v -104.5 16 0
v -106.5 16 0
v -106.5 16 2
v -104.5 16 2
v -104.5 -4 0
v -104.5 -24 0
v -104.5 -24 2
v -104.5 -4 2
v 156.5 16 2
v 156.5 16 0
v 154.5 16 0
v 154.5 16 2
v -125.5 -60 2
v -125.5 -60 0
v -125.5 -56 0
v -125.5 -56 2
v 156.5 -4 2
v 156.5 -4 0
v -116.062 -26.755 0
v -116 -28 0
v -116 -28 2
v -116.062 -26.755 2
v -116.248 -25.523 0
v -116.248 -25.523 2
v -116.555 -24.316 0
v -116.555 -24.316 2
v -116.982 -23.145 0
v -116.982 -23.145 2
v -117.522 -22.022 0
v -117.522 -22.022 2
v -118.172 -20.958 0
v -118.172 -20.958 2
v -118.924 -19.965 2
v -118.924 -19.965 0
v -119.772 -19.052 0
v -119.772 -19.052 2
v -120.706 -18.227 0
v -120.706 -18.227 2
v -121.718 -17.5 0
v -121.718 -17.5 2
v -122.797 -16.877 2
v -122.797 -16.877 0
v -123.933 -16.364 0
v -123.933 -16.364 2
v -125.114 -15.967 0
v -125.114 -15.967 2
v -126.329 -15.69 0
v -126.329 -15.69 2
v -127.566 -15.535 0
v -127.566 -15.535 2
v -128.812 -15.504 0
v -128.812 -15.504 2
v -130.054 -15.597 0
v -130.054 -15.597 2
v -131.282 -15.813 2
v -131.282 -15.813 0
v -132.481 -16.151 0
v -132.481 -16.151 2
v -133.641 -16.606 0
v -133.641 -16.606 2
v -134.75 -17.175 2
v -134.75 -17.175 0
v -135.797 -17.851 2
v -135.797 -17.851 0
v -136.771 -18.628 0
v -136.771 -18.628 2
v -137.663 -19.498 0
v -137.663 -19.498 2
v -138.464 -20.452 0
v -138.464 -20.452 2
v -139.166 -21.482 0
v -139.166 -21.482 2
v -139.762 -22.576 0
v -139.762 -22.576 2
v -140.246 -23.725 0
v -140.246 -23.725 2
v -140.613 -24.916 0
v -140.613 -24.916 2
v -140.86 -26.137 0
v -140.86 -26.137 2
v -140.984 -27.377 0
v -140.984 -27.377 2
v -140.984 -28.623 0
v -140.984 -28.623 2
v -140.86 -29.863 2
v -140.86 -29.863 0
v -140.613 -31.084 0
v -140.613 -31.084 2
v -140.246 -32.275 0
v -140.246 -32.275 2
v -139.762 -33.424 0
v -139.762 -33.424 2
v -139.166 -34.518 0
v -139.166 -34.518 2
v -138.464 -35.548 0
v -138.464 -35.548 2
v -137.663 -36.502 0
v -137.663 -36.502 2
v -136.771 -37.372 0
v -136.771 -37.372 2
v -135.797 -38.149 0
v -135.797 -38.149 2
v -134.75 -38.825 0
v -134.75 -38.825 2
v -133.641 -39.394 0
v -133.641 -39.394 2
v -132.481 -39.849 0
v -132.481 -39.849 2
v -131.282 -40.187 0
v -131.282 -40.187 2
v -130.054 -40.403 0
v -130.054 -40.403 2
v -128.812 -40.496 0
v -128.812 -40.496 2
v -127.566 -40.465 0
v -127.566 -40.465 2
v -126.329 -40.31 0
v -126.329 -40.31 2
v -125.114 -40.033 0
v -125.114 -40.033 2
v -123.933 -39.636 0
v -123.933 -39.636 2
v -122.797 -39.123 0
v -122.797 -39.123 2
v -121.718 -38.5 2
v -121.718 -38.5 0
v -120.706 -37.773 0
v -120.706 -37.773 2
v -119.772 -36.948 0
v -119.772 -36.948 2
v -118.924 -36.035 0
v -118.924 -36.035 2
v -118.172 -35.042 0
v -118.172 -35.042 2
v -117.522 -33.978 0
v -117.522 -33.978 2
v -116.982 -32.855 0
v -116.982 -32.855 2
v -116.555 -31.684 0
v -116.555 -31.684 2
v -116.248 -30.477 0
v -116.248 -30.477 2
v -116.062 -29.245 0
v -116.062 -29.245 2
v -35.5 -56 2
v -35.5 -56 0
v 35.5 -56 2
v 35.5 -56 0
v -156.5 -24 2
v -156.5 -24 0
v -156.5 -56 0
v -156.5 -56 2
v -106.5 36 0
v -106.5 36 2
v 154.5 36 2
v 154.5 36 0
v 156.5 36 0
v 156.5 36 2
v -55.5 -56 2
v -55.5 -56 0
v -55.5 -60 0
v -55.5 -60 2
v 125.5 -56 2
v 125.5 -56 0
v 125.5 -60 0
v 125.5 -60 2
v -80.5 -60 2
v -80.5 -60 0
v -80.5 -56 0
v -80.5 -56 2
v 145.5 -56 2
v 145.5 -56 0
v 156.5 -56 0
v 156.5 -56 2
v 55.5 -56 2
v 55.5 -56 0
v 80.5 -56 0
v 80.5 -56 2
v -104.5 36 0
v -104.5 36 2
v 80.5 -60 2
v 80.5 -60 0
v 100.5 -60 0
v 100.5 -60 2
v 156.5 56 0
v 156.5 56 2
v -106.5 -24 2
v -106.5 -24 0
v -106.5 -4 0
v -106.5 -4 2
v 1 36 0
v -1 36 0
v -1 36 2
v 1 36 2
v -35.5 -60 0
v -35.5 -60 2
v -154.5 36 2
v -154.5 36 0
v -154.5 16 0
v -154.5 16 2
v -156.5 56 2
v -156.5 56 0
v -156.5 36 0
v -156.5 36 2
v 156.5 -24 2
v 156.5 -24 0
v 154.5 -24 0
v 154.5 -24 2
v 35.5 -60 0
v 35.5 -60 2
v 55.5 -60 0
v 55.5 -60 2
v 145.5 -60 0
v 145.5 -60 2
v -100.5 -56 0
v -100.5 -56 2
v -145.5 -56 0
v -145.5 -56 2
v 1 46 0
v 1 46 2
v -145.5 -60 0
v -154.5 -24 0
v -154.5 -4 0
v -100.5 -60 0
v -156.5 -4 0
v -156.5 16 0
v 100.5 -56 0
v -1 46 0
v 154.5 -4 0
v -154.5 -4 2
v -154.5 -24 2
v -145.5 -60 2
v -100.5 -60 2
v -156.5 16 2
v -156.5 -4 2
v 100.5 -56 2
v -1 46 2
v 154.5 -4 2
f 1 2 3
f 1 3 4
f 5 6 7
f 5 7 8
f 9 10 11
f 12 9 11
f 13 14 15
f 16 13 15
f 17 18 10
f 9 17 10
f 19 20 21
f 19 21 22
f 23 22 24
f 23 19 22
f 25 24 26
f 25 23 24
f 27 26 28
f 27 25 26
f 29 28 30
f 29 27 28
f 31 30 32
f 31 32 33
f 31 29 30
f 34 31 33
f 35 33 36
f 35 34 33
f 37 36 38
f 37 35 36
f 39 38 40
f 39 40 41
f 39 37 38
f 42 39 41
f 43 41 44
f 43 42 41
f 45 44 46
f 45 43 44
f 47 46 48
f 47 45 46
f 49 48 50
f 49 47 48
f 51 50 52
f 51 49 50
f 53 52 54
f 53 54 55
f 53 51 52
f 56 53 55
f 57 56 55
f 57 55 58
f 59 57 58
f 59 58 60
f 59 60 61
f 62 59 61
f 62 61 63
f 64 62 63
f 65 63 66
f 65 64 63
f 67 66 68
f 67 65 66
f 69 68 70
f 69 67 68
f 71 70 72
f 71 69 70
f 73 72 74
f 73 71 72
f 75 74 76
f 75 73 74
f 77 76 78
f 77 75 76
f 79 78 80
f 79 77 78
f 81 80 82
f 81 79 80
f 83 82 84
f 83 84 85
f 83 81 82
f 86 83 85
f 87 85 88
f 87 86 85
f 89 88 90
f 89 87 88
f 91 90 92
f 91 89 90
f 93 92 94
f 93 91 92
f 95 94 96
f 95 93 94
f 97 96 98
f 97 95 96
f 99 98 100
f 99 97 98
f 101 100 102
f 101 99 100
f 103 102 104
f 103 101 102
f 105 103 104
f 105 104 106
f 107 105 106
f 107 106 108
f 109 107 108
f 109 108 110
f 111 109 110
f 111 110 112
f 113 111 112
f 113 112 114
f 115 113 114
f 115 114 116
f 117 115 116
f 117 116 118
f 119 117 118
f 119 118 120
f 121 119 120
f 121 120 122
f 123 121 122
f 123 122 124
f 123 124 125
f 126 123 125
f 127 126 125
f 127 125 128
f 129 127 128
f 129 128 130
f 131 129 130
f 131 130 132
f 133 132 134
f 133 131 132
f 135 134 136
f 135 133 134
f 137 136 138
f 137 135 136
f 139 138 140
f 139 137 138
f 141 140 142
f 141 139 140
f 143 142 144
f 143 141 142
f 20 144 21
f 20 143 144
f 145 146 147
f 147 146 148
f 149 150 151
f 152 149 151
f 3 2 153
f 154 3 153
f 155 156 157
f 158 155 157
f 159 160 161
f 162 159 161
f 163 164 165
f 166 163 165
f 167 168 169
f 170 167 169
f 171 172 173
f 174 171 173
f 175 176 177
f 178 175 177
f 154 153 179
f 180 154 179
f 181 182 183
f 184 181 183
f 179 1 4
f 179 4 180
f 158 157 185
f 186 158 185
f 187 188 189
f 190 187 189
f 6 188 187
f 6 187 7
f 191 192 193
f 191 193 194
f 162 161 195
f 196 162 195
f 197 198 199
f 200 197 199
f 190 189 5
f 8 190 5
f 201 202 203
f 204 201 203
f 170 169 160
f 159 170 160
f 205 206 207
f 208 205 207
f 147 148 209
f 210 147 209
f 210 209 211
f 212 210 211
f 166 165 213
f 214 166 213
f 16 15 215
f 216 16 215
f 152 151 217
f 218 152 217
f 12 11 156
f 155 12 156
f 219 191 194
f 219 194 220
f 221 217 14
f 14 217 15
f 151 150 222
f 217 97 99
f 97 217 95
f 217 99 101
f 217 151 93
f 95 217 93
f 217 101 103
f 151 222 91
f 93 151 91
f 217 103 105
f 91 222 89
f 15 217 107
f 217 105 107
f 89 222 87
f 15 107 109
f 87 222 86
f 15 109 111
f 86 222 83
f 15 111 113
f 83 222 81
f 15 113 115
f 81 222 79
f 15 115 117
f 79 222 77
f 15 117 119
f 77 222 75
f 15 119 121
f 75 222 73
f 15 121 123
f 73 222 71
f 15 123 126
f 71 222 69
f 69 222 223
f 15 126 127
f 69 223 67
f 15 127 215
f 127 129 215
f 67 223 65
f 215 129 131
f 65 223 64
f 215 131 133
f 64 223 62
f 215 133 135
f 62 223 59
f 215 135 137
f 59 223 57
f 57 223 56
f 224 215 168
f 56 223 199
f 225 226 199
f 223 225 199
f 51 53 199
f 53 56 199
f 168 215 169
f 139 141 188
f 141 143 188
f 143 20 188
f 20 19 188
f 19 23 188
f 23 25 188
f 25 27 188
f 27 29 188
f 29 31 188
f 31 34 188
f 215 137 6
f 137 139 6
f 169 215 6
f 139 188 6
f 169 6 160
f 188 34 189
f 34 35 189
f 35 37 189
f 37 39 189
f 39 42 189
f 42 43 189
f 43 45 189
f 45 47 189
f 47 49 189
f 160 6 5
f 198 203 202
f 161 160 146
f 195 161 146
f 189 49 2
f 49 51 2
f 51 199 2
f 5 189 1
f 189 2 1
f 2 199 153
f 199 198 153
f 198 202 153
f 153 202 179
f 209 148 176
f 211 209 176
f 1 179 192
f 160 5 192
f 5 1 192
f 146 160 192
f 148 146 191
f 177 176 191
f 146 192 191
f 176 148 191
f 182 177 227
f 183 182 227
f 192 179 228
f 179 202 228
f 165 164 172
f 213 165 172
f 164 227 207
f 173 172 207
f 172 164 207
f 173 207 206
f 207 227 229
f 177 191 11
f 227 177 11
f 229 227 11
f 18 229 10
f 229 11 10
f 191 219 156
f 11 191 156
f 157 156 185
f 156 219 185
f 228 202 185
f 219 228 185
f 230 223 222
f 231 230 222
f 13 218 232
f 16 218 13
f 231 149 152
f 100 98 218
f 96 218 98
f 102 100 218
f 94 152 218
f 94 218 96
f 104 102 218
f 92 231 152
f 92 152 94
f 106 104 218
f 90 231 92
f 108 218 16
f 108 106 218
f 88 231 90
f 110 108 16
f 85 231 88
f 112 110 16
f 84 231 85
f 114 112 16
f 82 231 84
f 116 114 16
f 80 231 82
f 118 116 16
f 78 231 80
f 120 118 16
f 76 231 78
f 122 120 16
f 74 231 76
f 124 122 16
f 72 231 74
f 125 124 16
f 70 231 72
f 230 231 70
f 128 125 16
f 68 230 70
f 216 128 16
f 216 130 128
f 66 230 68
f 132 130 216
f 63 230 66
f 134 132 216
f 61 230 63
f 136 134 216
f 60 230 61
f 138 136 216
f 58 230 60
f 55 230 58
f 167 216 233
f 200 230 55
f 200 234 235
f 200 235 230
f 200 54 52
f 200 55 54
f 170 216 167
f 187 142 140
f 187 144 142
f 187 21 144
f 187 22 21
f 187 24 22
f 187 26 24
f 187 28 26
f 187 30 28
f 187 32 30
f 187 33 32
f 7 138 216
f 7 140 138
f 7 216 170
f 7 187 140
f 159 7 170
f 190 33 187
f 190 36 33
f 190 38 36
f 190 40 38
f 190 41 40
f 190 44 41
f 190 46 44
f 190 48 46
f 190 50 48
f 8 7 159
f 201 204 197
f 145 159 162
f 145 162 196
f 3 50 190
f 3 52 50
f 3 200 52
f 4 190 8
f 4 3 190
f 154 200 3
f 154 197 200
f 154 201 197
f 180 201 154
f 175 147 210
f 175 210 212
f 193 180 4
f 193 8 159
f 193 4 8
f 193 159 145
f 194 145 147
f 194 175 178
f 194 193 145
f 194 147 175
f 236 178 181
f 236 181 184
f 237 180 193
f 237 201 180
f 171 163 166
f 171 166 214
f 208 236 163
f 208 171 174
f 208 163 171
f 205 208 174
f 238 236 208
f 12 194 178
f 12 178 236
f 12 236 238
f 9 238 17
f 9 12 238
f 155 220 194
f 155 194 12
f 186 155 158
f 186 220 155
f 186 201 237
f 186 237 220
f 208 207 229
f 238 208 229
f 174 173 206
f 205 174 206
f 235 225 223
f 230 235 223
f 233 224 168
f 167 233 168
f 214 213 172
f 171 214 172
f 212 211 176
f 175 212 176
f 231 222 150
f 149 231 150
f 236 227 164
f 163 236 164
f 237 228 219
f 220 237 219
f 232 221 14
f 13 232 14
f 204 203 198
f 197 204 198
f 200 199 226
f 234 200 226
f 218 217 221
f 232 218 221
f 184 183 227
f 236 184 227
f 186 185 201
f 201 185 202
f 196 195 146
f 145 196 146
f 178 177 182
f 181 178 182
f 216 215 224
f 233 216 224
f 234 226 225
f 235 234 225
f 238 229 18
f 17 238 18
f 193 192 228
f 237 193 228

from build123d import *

# Parameters (mm, degrees)
SKETCH2_R               = 12.5
SKETCH2_W               = 2
SKETCH2_H               = 20
BOSS_EXTRUDE1_DEPTH     = 2
CUT_EXTRUDE1_DEPTH      = 168.619360457
CUT_EXTRUDE1_DEPTH_BACK = 168.619360457
SKETCH3_W               = 20
SKETCH3_H               = 2
CUT_EXTRUDE2_DEPTH      = 168.619360457
CUT_EXTRUDE2_DEPTH_BACK = 168.619360457
SKETCH5_W               = 2
SKETCH5_H               = 10


with BuildPart() as part:
    # Sketch2 → Boss-Extrude1 (new body)
    with BuildSketch(Plane.XY):
        Polygon((-100.5, -56), (-100.5, -60), (-80.5, -60), (-80.5, -56), (-55.5, -56), (-55.5, -60), (-35.5, -60), (-35.5, -56), (35.5, -56), (35.5, -60), (55.5, -60), (55.5, -56), (80.5, -56), (80.5, -60), (100.5, -60), (100.5, -56), (125.5, -56), (125.5, -60), (145.5, -60), (145.5, -56), (156.5, -56), (156.5, -24), (154.5, -24), (154.5, -4), (156.5, -4), (156.5, 16), (154.5, 16), (154.5, 36), (156.5, 36), (156.5, 56), (145.5, 56), (145.5, 58), (125.5, 58), (125.5, 56), (100.5, 56), (100.5, 58), (80.5, 58), (80.5, 56), (55.5, 56), (55.5, 58), (35.5, 58), (35.5, 56), (-35.5, 56), (-35.5, 58), (-55.5, 58), (-55.5, 56), (-80.5, 56), (-80.5, 58), (-100.5, 58), (-100.5, 56), (-125.5, 56), (-125.5, 58), (-145.5, 58), (-145.5, 56), (-156.5, 56), (-156.5, 36), (-154.5, 36), (-154.5, 16), (-156.5, 16), (-156.5, -4), (-154.5, -4), (-154.5, -24), (-156.5, -24), (-156.5, -56), (-145.5, -56), (-145.5, -60), (-125.5, -60), (-125.5, -56), align=None)
        with Locations((-128.5, -28)):
            Circle(SKETCH2_R, mode=Mode.SUBTRACT)
        with Locations((-105.5, 26)):
            Rectangle(SKETCH2_W, SKETCH2_H, mode=Mode.SUBTRACT)
        with Locations((-105.5, -14)):
            Rectangle(SKETCH2_W, SKETCH2_H, mode=Mode.SUBTRACT)
    extrude(amount=BOSS_EXTRUDE1_DEPTH)

    # Sketch3 → Cut-Extrude1 (cut, two sides: drawn at the far end of the back side and taken through both)
    with BuildSketch(Plane.XY.offset(2).offset(-CUT_EXTRUDE1_DEPTH_BACK)):
        with Locations((-135.5, 57)):
            Rectangle(SKETCH3_W, SKETCH3_H)
        with Locations((-90.5, 57)):
            Rectangle(SKETCH3_W, SKETCH3_H)
        with Locations((-45.5, 57)):
            Rectangle(SKETCH3_W, SKETCH3_H)
        with Locations((45.5, 57)):
            Rectangle(SKETCH3_W, SKETCH3_H)
        with Locations((90.5, 57)):
            Rectangle(SKETCH3_W, SKETCH3_H)
        with Locations((135.5, 57)):
            Rectangle(SKETCH3_W, SKETCH3_H)
    extrude(amount=CUT_EXTRUDE1_DEPTH + CUT_EXTRUDE1_DEPTH_BACK, mode=Mode.SUBTRACT)

    # Sketch5 → Cut-Extrude2 (cut, two sides: drawn at the far end of the back side and taken through both)
    with BuildSketch(Plane.XY.offset(2).offset(-CUT_EXTRUDE2_DEPTH_BACK)):
        with Locations((0, 41)):
            Rectangle(SKETCH5_W, SKETCH5_H)
    extrude(amount=CUT_EXTRUDE2_DEPTH + CUT_EXTRUDE2_DEPTH_BACK, mode=Mode.SUBTRACT)


solid = part.part
